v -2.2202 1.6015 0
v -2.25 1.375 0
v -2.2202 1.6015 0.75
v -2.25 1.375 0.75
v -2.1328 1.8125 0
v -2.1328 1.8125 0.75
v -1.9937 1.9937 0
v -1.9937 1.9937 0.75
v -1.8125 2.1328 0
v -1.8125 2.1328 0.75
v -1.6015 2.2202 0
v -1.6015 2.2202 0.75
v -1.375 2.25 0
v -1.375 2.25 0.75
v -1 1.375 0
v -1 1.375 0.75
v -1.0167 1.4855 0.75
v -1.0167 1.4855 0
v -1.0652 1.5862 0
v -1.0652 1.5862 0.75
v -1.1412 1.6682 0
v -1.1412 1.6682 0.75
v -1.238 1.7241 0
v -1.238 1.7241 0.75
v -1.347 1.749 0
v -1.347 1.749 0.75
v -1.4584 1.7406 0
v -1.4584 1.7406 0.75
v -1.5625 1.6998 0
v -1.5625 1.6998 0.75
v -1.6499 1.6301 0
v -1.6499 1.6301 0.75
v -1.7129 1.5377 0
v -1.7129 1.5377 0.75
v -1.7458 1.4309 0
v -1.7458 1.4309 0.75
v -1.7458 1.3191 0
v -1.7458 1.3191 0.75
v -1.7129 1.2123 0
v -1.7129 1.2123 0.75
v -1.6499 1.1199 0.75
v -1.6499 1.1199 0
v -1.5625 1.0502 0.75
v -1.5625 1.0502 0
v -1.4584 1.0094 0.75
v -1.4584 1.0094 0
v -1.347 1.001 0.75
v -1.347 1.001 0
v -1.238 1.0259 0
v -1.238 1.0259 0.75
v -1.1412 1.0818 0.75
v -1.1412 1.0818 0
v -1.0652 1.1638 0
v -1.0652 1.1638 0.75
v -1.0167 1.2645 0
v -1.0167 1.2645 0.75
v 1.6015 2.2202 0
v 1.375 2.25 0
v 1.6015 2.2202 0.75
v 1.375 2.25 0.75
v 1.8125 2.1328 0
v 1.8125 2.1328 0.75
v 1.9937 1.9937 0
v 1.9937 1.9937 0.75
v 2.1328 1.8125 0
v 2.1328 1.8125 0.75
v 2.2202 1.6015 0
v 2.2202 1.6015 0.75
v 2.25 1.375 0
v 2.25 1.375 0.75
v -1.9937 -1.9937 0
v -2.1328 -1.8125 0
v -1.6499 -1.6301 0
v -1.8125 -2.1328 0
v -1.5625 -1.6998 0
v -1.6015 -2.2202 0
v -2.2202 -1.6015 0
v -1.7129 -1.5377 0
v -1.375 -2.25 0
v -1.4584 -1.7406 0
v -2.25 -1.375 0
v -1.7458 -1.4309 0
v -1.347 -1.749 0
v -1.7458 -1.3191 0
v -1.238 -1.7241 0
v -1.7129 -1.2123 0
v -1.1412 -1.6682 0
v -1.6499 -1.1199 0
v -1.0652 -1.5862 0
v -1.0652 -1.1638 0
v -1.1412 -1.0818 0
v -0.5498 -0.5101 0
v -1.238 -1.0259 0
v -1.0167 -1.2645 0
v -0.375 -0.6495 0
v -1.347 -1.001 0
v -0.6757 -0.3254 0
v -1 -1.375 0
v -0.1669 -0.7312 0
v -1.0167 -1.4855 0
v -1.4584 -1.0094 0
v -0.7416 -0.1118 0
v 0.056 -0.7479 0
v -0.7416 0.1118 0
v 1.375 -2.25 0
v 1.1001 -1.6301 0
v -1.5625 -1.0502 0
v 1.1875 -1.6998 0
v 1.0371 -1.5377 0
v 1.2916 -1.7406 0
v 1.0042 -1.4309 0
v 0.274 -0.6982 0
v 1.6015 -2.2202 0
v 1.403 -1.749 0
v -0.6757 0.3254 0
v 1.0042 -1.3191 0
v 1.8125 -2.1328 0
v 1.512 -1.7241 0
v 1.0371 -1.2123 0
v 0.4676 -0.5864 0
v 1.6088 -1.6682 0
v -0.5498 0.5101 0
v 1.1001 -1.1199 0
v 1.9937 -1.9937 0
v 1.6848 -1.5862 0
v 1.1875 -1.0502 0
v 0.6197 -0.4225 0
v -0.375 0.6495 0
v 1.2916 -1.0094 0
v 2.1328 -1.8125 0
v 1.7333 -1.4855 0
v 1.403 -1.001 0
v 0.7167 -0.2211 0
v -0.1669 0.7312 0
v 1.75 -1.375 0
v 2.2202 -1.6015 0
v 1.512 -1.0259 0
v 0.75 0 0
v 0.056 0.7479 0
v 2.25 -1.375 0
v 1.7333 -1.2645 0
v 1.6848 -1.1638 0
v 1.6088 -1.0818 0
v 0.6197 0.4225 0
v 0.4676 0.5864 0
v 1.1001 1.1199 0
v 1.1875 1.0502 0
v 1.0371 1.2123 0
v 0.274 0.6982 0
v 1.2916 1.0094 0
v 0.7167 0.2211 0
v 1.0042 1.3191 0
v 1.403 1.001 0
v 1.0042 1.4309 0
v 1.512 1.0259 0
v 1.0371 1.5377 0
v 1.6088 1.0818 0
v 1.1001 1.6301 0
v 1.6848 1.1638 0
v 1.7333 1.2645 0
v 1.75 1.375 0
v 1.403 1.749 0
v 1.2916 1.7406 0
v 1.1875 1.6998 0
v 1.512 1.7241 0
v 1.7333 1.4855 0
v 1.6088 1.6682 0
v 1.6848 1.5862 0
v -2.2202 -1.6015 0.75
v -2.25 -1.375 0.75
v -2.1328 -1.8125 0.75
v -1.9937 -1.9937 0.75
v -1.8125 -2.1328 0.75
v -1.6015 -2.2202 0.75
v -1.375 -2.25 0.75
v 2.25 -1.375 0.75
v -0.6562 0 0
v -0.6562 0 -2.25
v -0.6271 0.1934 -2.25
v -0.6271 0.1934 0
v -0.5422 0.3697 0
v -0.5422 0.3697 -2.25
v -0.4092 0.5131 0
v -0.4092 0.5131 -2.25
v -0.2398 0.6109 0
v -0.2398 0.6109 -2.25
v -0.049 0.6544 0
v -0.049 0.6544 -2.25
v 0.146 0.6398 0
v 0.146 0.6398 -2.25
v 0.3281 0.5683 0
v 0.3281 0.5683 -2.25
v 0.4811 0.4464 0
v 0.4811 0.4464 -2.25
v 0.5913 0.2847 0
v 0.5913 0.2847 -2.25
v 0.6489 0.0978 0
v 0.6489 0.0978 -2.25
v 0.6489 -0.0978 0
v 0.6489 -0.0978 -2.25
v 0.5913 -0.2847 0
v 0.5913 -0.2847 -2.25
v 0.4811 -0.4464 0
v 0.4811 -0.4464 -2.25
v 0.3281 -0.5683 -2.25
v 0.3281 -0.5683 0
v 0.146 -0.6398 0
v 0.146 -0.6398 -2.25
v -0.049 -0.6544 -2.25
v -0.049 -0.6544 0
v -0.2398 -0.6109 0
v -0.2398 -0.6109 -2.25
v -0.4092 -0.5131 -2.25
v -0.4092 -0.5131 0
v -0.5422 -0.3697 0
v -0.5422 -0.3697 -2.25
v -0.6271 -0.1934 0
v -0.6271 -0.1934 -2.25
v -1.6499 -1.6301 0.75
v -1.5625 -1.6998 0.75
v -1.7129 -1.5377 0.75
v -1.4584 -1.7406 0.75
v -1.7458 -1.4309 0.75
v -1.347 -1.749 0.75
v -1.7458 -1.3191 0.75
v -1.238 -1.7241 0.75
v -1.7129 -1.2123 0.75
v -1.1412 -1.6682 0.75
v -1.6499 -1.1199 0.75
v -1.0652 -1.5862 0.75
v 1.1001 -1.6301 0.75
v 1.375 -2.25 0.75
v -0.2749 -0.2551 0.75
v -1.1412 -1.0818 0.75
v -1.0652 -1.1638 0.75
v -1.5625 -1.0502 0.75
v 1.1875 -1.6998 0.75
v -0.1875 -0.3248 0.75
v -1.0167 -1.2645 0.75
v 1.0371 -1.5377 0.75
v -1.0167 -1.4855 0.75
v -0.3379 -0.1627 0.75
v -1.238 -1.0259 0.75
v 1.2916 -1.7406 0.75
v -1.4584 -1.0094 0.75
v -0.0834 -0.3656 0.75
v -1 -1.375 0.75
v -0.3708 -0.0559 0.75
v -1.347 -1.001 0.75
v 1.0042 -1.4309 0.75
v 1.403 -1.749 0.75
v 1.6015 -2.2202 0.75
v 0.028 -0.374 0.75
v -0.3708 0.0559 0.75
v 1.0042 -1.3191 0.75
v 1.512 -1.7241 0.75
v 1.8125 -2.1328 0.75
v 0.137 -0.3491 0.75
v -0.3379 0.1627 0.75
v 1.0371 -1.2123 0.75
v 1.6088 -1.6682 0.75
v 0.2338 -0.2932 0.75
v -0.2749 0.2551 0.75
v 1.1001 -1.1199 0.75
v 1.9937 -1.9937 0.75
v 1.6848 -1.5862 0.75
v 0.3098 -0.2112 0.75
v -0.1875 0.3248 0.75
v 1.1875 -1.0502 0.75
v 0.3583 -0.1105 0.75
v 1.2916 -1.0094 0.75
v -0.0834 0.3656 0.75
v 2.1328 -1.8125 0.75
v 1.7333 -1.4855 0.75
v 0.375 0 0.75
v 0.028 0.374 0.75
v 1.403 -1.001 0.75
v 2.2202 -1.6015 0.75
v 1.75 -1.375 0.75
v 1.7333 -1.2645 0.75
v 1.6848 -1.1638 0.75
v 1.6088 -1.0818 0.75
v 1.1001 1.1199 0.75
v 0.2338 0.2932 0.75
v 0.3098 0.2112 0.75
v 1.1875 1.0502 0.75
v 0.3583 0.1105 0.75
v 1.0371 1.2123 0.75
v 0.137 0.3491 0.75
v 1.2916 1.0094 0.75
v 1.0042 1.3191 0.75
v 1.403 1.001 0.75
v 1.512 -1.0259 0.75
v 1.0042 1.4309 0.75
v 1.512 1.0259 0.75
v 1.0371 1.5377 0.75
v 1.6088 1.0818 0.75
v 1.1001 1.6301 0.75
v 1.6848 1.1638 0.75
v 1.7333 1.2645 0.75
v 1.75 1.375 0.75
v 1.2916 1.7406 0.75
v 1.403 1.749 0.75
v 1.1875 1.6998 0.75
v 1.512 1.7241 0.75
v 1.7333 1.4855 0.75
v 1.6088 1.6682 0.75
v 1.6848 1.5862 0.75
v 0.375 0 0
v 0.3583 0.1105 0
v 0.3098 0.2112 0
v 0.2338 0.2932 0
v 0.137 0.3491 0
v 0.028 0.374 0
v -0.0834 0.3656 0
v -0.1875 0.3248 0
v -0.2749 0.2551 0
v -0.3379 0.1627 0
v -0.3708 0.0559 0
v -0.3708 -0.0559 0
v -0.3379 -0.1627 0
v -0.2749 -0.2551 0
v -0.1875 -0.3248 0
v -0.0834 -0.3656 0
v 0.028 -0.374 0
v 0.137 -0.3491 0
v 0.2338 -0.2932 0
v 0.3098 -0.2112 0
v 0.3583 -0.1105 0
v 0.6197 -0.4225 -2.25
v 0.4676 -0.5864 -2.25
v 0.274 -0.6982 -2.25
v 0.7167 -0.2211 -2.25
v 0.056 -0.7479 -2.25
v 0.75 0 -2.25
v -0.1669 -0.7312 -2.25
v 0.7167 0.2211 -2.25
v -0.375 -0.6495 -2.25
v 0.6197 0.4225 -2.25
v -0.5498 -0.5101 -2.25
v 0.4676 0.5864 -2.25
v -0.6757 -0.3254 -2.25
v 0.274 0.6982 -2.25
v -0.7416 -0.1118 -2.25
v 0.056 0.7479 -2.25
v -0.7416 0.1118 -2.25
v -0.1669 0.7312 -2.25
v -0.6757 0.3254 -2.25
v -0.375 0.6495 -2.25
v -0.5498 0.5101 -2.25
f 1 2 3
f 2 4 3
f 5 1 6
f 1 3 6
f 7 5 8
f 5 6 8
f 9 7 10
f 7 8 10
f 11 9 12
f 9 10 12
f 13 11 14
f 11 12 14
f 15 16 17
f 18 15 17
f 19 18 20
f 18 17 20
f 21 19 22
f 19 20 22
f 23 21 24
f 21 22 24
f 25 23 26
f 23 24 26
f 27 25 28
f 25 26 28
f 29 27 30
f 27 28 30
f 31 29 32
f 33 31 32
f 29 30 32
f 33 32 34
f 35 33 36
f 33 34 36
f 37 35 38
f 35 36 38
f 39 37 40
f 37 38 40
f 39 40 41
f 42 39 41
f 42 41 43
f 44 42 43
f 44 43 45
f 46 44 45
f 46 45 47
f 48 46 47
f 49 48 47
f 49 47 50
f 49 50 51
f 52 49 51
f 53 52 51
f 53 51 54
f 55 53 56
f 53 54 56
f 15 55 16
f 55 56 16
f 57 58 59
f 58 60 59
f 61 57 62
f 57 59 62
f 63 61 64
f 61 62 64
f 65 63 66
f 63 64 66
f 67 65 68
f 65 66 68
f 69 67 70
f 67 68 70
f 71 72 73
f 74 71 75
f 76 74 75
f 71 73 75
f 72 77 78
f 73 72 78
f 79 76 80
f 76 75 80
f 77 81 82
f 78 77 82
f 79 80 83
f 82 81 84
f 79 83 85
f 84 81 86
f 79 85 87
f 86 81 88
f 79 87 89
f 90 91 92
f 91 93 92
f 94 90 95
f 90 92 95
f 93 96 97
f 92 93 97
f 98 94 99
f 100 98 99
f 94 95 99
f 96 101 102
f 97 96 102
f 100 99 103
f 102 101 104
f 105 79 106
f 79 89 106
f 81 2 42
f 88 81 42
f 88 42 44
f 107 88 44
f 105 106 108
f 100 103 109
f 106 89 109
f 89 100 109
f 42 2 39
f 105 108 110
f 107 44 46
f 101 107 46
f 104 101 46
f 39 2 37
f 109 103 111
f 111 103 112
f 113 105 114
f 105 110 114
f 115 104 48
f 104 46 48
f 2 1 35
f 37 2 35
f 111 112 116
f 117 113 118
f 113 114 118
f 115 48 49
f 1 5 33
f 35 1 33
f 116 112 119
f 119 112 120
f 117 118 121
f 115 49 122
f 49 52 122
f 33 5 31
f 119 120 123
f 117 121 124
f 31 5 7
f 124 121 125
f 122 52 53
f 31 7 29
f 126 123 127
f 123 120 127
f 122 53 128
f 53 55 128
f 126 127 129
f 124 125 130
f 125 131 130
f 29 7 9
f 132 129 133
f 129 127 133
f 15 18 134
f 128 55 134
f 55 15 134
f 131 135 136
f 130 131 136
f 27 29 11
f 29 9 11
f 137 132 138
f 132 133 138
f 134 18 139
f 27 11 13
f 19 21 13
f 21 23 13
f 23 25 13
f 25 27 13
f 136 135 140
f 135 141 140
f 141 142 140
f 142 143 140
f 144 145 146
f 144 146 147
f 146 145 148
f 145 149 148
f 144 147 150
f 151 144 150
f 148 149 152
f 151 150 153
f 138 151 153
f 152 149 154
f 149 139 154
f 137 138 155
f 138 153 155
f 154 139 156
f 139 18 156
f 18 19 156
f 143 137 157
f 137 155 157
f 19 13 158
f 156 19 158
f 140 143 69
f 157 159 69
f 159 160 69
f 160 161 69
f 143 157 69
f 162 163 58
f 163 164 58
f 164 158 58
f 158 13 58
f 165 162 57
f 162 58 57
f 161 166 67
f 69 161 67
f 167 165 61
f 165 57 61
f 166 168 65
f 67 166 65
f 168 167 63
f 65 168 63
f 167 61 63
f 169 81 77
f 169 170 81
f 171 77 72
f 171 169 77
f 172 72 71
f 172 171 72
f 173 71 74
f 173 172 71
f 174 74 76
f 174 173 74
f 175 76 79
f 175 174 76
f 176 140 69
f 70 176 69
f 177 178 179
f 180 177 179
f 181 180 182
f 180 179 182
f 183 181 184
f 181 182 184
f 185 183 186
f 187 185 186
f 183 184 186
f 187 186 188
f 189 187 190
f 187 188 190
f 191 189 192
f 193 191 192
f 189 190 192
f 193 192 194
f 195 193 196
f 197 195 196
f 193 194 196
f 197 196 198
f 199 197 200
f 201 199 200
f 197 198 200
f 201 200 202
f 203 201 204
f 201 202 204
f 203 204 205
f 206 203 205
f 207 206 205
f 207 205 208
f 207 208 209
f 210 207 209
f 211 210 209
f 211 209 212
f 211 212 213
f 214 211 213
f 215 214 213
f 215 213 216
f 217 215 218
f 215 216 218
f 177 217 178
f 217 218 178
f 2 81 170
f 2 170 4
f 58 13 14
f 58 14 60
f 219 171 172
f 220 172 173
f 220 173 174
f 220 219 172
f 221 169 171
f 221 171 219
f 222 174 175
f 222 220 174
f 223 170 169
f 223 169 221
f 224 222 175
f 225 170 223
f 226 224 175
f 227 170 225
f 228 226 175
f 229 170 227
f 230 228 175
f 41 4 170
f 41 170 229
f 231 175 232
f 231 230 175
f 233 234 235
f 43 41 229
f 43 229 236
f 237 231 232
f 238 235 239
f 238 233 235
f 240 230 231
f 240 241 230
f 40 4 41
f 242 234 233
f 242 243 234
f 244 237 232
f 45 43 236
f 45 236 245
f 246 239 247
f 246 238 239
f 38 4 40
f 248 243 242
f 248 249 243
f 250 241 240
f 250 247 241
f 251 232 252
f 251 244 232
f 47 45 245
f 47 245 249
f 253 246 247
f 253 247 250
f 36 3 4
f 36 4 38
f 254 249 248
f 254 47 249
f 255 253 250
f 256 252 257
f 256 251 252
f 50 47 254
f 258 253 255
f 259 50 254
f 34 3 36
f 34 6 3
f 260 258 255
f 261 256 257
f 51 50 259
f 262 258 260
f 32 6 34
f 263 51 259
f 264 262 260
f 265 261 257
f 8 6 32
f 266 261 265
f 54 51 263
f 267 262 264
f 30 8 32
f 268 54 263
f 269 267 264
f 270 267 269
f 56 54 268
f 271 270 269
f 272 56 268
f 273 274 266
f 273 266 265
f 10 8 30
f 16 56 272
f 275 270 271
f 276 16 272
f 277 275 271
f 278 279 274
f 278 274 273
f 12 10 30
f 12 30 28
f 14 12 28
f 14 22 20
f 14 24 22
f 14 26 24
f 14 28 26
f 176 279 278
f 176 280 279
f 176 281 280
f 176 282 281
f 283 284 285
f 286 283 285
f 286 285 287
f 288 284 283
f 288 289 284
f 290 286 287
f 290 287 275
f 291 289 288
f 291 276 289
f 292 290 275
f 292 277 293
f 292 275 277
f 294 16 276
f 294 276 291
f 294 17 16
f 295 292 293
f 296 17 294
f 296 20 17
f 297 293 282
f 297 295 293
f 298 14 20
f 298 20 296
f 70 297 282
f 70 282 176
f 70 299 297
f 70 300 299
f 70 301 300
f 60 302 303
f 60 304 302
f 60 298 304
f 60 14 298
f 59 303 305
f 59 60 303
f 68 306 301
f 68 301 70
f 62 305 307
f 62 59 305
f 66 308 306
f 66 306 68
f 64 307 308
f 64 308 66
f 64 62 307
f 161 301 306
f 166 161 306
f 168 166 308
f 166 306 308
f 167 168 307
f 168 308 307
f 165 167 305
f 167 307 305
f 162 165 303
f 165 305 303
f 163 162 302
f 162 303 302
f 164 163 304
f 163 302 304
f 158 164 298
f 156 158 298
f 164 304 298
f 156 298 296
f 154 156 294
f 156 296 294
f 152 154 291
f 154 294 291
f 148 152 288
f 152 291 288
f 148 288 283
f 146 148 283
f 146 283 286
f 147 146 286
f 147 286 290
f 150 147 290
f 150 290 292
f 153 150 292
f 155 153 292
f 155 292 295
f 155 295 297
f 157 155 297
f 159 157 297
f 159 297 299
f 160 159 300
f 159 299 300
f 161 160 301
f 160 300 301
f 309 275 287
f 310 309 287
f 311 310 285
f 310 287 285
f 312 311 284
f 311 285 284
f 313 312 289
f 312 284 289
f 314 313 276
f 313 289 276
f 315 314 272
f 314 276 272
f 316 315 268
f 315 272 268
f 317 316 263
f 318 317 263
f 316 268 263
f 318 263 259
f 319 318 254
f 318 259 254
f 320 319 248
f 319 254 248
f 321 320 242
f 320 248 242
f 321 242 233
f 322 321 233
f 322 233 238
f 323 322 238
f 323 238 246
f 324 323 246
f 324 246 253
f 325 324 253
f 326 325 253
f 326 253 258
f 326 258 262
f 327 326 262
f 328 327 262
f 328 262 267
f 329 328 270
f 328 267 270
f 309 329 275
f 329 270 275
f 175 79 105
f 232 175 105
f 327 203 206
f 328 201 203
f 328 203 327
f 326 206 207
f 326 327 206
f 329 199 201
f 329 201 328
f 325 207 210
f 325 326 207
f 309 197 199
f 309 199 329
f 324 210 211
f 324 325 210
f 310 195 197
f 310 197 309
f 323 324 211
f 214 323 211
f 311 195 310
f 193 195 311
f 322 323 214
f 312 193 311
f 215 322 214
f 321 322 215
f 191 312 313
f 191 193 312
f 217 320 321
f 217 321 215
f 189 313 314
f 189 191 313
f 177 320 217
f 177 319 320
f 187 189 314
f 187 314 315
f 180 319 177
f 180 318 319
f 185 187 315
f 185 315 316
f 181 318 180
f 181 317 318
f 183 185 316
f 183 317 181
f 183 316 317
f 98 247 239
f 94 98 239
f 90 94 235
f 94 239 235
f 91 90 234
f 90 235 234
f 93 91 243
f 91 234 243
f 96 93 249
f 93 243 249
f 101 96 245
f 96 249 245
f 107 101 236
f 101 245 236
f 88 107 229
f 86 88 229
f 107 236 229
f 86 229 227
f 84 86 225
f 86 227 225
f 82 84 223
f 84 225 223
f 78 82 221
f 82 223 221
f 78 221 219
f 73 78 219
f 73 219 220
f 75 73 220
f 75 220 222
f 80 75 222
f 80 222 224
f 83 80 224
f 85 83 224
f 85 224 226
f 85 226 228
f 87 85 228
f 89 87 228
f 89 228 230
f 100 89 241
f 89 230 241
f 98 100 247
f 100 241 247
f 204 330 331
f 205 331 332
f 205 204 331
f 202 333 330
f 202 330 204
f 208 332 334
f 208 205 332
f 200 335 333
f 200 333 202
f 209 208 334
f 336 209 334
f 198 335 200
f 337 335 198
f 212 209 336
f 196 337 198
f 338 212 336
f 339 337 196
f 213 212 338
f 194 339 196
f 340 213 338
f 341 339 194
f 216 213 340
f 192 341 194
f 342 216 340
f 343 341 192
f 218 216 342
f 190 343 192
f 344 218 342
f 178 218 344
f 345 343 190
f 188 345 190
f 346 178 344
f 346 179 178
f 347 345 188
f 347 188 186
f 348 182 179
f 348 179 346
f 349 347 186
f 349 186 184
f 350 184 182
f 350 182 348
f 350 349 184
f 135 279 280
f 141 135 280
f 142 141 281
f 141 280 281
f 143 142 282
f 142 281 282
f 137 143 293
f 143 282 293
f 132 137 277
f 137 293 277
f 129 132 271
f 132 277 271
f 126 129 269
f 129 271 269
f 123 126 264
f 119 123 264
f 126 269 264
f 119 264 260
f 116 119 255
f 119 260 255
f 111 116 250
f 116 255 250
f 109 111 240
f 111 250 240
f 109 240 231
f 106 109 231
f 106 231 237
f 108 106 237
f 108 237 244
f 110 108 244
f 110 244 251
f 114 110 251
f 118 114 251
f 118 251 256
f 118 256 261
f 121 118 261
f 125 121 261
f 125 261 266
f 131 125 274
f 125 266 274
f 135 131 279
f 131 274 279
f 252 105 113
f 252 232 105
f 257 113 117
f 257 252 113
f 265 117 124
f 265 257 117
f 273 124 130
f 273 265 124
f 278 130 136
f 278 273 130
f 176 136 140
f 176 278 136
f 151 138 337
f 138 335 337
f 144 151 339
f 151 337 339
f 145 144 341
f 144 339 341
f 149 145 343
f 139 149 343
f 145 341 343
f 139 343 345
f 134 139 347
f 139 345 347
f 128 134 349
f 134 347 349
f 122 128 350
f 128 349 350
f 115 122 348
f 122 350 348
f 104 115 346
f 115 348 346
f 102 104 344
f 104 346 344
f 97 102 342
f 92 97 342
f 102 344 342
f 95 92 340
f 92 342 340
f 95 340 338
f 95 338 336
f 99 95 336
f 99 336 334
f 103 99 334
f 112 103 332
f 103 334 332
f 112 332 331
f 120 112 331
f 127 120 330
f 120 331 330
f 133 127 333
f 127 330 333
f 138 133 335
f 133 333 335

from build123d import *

# Parameters (mm, degrees)
SKETCH1_W           = 0.75
SKETCH1_H           = 2.25
SKETCH2_W           = 4.5
SKETCH2_H           = 4.5
BOSS_EXTRUDE1_DEPTH = 0.75
FILLET2_R           = 0.875
SKETCH6_R           = 0.375
CUT_EXTRUDE1_DEPTH  = 0.75
SKETCH9_R           = 0.65625
CUT_EXTRUDE2_DEPTH  = 2.25


with BuildPart() as part:
    # Sketch1 → Revolve1 (revolve)
    with BuildSketch(Plane(origin=(0, 0, 0), x_dir=(1, 0, 0), z_dir=(0, 1, 0))):
        with Locations((0.375, 1.125)):
            Rectangle(SKETCH1_W, SKETCH1_H)
    revolve(axis=Axis((0, 0, -2.883913043), (0, 0, 1)))

    # Sketch2 → Boss-Extrude1 (add)
    with BuildSketch(Plane.XY):
        Rectangle(SKETCH2_W, SKETCH2_H)
    extrude(amount=BOSS_EXTRUDE1_DEPTH)

    # Fillet2
    fillet2_edges = [part.edges().sort_by_distance(p)[0] for p in [
        (2.25, -2.25, 0.375),
        (2.25, 2.25, 0.375),
        (-2.25, 2.25, 0.375),
        (-2.25, -2.25, 0.375),
    ]]
    fillet(fillet2_edges, radius=FILLET2_R)

    # Sketch6 → Cut-Extrude1 (cut)
    with BuildSketch(Plane.XY.offset(0.75)):
        with Locations((-1.375, 1.375)):
            Circle(SKETCH6_R)
        with Locations((1.375, 1.375)):
            Circle(SKETCH6_R)
        Circle(SKETCH6_R)
        with Locations((-1.375, -1.375)):
            Circle(SKETCH6_R)
        with Locations((1.375, -1.375)):
            Circle(SKETCH6_R)
    extrude(amount=-CUT_EXTRUDE1_DEPTH, mode=Mode.SUBTRACT)

    # Sketch9 → Cut-Extrude2 (cut)
    with BuildSketch(Plane(origin=(0, 0, -2.25), x_dir=(-1, 0, 0), z_dir=(0, 0, -1))):
        Circle(SKETCH9_R)
    extrude(amount=-CUT_EXTRUDE2_DEPTH, mode=Mode.SUBTRACT)


solid = part.part
